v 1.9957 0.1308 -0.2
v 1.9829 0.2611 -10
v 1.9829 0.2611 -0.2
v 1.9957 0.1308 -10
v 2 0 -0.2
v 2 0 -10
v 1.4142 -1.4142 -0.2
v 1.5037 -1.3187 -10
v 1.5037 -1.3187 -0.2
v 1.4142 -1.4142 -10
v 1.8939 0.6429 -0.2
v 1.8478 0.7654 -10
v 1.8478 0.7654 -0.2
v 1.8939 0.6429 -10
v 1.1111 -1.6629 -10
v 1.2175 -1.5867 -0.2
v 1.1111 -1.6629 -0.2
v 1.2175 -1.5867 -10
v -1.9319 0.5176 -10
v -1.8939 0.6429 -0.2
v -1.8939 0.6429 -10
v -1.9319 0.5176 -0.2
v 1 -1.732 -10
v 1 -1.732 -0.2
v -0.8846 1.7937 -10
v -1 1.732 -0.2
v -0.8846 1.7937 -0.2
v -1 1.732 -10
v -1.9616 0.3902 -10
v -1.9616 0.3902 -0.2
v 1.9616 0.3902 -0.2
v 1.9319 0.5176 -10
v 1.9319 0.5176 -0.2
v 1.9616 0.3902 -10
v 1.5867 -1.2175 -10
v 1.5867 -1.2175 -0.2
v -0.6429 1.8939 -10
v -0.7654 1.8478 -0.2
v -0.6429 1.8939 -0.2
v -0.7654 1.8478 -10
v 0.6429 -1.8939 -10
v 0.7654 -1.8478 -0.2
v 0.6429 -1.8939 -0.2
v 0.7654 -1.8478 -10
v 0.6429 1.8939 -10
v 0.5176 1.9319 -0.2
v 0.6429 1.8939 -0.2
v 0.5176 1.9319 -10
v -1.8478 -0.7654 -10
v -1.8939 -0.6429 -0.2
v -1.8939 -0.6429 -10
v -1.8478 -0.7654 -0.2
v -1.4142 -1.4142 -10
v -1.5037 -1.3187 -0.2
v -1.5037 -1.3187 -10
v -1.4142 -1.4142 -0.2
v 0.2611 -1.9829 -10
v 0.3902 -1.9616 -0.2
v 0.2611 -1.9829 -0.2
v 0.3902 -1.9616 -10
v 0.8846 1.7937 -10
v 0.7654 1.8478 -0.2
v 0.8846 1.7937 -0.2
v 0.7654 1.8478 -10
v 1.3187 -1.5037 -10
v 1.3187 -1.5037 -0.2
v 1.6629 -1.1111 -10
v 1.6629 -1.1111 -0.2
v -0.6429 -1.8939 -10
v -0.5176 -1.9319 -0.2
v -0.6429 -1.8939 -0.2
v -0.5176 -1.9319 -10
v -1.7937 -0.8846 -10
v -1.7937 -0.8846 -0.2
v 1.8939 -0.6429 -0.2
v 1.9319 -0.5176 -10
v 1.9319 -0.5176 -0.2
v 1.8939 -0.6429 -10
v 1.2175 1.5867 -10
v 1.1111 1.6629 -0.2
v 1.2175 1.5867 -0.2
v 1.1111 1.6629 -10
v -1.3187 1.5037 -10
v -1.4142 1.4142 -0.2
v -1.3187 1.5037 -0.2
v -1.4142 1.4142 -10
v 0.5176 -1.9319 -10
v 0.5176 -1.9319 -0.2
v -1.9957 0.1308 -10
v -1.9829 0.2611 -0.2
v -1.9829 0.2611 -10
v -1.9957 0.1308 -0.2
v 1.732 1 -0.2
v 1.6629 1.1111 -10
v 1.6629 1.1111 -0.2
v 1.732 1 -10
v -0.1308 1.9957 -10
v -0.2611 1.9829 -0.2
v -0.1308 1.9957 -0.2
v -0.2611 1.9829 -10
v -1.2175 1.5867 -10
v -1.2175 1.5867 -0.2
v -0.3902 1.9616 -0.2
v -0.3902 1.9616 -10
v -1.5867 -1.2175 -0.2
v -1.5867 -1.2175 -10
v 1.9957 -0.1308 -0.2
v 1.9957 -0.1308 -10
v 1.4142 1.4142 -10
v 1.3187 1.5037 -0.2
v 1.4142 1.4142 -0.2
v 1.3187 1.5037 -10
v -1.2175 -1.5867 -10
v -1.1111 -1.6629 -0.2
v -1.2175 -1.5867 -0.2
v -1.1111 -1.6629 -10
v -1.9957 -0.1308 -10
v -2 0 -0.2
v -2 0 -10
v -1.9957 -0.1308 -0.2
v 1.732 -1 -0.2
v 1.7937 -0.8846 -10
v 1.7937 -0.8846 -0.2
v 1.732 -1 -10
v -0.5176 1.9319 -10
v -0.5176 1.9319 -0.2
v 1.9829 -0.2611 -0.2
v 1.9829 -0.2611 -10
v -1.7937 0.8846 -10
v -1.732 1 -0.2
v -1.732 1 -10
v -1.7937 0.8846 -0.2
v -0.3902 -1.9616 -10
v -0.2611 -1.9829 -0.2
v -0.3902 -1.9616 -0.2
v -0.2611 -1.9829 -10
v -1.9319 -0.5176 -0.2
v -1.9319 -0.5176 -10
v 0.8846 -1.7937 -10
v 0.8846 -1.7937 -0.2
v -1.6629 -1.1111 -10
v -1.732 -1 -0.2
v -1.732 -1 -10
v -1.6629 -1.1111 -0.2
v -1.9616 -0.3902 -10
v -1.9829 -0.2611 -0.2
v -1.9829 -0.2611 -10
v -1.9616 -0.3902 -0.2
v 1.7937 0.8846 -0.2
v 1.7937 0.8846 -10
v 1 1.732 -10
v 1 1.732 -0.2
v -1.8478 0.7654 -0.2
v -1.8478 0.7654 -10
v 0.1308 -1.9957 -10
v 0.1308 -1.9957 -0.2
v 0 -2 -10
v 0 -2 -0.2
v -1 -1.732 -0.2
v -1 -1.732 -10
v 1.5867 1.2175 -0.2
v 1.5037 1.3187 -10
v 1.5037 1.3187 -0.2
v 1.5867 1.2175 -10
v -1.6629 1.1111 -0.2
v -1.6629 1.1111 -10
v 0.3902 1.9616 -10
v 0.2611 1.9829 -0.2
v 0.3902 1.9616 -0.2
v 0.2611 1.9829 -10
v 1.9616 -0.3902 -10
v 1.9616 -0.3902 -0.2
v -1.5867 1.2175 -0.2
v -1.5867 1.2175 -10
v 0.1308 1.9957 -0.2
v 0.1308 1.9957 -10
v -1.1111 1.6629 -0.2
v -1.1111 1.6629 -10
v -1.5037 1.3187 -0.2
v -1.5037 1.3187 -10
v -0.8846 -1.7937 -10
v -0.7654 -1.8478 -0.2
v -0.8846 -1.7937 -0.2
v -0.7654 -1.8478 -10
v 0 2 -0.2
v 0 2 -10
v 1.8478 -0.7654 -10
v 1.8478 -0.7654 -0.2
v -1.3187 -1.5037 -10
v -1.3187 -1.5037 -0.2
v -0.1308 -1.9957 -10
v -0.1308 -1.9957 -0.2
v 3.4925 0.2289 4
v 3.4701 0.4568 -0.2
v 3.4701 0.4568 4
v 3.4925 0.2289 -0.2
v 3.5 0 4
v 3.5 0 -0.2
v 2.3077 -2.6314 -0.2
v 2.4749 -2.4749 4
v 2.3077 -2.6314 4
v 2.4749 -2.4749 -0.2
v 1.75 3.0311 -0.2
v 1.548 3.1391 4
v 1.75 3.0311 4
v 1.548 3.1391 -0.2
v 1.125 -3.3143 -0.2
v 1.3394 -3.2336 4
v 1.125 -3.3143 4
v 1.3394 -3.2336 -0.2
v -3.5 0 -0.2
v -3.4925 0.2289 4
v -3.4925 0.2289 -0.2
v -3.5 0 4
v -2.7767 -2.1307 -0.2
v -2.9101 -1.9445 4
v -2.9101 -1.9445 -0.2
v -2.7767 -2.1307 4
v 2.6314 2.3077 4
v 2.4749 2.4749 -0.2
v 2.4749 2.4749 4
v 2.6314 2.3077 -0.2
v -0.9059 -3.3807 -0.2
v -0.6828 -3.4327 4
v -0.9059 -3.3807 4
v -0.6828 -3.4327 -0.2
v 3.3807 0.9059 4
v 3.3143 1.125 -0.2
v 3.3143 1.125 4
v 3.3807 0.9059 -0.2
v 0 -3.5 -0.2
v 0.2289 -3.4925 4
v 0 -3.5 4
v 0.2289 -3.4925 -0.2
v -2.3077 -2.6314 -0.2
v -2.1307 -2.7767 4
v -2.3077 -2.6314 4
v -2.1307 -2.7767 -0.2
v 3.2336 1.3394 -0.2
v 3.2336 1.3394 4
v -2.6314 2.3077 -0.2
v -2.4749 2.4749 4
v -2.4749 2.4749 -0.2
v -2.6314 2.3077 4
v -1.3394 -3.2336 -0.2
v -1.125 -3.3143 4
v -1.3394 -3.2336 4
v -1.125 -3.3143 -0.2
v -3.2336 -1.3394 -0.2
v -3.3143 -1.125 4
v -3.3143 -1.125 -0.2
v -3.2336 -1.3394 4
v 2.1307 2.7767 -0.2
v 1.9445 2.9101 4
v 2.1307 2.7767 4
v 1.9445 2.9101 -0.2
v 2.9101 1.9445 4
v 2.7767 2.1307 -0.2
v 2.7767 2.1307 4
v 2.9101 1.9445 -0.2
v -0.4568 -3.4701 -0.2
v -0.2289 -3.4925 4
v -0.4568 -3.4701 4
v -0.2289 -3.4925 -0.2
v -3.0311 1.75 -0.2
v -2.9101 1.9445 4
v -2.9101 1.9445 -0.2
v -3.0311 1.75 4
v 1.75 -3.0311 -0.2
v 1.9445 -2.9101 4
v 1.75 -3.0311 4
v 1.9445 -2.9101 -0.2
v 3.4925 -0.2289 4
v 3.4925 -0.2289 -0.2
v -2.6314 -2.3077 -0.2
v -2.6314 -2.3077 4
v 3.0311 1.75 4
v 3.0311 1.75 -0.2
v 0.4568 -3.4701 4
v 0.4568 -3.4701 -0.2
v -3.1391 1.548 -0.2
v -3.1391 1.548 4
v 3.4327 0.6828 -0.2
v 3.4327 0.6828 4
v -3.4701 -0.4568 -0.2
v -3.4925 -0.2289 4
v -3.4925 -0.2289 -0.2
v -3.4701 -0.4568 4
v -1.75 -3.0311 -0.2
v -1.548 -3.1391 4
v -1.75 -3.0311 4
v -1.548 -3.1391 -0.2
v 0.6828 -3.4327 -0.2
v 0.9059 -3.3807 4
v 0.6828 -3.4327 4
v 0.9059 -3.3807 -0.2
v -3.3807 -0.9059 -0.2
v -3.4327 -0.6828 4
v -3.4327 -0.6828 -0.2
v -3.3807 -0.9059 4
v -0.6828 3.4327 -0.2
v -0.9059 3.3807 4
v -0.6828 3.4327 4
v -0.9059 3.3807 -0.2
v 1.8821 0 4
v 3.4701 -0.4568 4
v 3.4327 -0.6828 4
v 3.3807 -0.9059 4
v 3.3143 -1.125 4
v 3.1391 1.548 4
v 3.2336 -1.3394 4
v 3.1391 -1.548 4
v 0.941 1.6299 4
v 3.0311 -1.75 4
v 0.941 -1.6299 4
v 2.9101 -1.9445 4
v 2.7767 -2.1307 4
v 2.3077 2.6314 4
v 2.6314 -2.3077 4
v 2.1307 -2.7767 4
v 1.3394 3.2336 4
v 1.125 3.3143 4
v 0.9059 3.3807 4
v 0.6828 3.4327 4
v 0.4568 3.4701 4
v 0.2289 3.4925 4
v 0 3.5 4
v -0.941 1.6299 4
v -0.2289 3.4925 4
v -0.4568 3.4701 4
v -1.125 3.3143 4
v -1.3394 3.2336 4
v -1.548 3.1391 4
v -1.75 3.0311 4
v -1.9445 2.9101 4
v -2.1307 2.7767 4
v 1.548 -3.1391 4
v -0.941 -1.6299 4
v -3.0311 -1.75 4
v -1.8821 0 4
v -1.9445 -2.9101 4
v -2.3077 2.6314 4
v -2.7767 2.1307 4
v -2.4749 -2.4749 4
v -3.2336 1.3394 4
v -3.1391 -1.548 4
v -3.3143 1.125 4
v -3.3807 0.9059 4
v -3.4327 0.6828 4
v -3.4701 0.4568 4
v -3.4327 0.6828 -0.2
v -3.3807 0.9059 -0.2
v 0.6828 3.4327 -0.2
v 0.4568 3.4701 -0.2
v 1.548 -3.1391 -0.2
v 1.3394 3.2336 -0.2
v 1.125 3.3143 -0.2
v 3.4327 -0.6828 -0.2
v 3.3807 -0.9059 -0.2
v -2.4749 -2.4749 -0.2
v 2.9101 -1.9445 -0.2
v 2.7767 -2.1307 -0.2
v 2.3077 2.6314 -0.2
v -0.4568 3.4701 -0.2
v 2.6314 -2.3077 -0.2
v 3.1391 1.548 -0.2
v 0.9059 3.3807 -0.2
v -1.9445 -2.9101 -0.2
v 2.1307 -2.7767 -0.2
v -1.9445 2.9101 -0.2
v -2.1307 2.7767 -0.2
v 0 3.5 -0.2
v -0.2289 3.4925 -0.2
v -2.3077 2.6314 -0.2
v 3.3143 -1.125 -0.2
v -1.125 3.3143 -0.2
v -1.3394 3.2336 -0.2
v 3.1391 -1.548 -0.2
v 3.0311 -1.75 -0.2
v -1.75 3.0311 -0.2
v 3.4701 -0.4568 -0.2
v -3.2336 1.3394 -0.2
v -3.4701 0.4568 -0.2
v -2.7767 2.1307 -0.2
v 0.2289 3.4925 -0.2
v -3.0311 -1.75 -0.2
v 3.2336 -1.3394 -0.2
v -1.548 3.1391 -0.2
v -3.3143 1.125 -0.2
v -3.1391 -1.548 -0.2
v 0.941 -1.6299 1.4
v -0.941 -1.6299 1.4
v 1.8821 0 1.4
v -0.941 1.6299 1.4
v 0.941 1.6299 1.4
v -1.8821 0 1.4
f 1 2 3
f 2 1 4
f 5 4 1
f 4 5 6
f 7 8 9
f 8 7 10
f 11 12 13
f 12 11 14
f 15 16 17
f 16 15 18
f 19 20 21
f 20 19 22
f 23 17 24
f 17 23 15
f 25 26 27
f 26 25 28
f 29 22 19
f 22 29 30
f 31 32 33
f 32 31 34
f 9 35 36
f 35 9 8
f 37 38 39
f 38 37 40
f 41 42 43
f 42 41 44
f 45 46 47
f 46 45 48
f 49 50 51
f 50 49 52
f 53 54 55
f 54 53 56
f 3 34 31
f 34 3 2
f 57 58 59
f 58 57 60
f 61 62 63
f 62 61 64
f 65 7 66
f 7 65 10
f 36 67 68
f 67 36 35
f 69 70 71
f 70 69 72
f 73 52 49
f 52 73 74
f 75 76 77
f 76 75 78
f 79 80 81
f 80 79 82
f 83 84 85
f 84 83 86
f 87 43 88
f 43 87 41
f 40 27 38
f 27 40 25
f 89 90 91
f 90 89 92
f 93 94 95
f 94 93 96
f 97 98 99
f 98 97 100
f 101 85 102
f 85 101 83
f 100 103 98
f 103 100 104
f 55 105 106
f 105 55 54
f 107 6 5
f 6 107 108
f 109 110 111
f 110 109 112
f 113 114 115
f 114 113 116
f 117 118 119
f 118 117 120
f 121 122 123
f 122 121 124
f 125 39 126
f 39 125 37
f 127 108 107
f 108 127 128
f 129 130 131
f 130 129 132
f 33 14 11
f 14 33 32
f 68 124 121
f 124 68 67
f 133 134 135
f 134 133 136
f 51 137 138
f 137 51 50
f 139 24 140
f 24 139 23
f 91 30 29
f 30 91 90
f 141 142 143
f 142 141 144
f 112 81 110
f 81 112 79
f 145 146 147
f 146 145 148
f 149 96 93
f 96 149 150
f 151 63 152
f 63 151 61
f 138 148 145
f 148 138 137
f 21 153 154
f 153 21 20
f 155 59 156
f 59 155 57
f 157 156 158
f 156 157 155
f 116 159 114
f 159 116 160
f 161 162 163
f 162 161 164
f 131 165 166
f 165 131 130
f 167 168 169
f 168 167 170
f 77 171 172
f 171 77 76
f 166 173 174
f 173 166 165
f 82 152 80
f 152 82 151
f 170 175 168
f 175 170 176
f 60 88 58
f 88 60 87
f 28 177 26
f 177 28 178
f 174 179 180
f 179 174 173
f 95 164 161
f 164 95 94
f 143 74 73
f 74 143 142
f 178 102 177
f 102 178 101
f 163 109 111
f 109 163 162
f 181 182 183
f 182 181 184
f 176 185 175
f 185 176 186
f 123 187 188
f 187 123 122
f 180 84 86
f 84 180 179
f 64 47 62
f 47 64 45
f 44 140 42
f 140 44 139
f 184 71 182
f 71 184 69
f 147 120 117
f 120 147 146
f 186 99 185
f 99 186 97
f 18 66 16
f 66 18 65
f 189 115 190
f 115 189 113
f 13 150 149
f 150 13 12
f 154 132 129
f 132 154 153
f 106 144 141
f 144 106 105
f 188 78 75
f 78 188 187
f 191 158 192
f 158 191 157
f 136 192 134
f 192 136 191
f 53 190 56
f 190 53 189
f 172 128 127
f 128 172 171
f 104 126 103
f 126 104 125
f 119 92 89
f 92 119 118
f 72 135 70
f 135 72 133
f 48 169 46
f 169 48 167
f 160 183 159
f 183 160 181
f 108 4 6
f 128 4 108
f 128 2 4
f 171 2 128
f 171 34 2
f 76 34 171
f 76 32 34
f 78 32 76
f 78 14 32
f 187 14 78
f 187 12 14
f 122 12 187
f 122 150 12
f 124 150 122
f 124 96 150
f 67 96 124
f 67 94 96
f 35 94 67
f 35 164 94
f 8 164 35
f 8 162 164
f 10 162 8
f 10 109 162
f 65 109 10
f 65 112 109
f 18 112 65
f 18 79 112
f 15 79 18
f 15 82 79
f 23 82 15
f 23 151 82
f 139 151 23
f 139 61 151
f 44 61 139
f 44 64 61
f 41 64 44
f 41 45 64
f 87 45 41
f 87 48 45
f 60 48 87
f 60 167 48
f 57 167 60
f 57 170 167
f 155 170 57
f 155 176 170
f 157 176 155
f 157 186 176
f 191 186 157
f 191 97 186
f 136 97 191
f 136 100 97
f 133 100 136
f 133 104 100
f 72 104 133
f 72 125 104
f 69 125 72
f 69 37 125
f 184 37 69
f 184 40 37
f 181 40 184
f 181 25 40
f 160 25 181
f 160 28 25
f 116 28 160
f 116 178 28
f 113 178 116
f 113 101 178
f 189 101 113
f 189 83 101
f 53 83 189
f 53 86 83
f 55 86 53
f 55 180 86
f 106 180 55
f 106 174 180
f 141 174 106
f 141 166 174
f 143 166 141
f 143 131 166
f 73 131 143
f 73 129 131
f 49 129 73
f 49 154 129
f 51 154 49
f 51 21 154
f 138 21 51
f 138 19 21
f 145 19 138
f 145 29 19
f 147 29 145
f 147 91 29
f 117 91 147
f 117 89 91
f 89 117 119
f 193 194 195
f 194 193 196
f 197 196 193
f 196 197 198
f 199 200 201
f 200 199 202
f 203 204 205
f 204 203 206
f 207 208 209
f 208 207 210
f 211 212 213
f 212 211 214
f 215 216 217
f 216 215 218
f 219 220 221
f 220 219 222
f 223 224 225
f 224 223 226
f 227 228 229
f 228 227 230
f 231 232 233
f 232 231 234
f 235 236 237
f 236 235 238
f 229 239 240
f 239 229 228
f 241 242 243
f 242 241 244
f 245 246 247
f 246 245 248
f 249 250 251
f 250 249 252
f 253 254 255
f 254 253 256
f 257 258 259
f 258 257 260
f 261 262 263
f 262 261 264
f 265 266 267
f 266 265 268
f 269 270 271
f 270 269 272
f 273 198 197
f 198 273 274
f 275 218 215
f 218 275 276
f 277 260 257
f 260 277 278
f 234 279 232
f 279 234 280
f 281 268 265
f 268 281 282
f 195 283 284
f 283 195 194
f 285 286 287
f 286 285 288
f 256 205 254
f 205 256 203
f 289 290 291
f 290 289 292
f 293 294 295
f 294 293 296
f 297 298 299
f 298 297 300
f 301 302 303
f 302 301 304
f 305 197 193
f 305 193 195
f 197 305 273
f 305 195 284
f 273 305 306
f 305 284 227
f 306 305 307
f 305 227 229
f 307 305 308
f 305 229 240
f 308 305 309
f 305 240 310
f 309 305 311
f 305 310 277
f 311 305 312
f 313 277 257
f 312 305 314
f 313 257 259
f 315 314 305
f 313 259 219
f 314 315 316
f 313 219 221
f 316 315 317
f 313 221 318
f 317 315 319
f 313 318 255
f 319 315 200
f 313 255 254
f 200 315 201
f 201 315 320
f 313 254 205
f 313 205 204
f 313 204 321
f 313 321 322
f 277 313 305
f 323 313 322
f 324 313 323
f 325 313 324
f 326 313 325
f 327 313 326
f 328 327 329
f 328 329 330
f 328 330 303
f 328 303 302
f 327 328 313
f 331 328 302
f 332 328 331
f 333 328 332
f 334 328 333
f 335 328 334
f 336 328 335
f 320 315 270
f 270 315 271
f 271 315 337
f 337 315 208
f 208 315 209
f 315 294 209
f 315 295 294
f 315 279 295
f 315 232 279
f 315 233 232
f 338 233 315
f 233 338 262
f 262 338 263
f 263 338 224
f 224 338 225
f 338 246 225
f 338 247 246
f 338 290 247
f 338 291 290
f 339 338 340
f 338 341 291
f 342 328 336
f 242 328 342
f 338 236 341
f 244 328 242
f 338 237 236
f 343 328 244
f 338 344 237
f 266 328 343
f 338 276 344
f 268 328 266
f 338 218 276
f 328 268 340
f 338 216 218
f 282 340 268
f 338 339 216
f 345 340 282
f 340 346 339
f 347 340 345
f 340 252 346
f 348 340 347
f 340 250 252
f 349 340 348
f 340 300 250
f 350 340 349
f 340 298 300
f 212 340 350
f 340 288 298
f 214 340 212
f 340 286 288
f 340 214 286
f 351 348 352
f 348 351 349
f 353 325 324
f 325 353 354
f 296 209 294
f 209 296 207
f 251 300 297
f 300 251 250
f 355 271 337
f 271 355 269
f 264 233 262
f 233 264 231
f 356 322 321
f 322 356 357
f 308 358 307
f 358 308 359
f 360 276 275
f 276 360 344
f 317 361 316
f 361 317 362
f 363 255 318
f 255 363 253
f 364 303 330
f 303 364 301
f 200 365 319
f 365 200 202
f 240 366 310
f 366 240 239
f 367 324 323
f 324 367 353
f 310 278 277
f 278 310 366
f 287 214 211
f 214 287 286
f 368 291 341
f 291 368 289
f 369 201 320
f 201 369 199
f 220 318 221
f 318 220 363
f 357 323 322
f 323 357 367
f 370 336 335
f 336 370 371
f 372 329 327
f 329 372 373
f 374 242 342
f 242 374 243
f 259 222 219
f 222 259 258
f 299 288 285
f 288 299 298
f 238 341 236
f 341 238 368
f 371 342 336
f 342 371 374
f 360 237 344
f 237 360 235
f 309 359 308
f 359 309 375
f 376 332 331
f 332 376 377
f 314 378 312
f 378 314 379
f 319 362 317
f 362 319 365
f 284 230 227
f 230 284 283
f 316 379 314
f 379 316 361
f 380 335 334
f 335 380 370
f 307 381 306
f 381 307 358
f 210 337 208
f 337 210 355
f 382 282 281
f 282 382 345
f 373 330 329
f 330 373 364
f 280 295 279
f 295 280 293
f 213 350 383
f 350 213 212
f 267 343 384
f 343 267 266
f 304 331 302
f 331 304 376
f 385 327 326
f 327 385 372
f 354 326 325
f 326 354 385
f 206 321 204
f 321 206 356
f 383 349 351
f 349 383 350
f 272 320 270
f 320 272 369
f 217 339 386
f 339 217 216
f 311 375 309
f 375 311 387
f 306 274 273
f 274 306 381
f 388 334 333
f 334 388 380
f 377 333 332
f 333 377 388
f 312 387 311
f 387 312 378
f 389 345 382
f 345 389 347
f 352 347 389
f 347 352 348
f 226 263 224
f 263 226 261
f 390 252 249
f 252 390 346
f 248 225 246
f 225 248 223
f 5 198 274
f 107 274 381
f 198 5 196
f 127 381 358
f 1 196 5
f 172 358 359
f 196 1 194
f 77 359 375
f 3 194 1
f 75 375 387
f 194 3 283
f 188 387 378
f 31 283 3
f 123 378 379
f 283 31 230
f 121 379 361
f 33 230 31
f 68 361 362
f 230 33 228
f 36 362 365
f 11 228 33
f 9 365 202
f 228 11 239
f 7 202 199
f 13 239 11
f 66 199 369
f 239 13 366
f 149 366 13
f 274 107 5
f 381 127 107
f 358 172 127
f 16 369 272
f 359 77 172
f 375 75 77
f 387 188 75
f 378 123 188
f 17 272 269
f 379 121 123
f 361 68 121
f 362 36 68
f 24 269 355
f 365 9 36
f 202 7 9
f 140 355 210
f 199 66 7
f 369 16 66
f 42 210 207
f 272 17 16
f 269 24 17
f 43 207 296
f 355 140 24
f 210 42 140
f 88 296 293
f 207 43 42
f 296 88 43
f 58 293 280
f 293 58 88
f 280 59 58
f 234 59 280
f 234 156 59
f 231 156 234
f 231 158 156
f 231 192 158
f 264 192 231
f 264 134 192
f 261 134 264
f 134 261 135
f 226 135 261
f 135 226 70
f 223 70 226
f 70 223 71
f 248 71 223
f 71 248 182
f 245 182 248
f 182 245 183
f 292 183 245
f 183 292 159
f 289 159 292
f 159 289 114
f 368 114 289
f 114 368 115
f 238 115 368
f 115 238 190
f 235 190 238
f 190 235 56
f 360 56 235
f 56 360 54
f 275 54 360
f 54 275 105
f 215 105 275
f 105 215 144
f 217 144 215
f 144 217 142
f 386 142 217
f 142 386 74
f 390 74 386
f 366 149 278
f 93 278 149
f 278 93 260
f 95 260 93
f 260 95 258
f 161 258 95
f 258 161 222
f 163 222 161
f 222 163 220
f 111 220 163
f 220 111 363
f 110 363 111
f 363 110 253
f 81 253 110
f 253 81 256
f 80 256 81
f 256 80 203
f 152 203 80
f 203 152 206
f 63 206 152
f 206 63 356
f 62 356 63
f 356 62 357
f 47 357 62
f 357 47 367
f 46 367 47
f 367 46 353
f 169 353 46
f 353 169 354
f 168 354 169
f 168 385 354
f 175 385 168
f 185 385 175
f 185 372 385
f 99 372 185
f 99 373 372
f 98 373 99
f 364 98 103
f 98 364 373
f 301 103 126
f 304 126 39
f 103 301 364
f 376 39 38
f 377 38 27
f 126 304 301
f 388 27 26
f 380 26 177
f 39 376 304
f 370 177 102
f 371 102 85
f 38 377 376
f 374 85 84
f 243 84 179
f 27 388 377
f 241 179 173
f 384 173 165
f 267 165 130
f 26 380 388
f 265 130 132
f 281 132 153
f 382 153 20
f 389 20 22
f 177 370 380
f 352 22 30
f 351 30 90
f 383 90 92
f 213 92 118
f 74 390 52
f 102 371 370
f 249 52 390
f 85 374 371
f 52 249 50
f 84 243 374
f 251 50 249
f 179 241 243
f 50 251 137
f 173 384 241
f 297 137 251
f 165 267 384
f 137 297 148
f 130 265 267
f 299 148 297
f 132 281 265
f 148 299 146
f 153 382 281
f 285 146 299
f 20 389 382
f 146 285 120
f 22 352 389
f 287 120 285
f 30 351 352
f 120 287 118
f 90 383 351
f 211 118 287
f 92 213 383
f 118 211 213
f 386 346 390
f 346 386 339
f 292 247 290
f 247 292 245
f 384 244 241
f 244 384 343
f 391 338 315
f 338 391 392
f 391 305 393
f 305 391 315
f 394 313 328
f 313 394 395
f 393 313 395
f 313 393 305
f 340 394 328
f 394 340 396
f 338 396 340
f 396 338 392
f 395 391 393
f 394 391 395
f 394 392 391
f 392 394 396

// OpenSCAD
$fn = 96;

// Target dimensions (mm)
shaft_diameter_mm = 4.0;
length_mm         = 10.0;   // under-head length
head_diameter_mm  = 7.0;
head_height_mm    = 4.0;

// Socket (approx for M4 SHCS)
socket_across_flats_mm = 3.0;
socket_depth_mm        = 2.5;

// Small overlaps / clearances
overlap_mm   = 0.2;   // ensures watertight unions
socket_clear = 0.15;  // makes socket visible/printable

module socket_head_cap_screw(
    d=shaft_diameter_mm,
    L=length_mm,
    head_d=head_diameter_mm,
    head_h=head_height_mm,
    sock_af=socket_across_flats_mm,
    sock_depth=socket_depth_mm
){
    r_shank = d/2;
    r_head  = head_d/2;

    // Hex socket circumscribed radius from across-flats
    r_hex = (sock_af/2) / cos(30);

    // Place underside of head at z=0, head up (+z), shank down (-z)
    difference() {
        union() {
            // Shank
            translate([0,0,-L/2])
                cylinder(h=L, r=r_shank, center=true);

            // Head (clean cylinder)
            translate([0,0, head_h/2 - overlap_mm/2])
                cylinder(h=head_h + overlap_mm, r=r_head, center=true);
        }

        // Internal hex socket cut from top face
        translate([0,0, head_h - sock_depth/2])
            cylinder(h=sock_depth + overlap_mm,
                     r=r_hex + socket_clear,
                     center=true,
                     $fn=6);
    }
}

socket_head_cap_screw();
